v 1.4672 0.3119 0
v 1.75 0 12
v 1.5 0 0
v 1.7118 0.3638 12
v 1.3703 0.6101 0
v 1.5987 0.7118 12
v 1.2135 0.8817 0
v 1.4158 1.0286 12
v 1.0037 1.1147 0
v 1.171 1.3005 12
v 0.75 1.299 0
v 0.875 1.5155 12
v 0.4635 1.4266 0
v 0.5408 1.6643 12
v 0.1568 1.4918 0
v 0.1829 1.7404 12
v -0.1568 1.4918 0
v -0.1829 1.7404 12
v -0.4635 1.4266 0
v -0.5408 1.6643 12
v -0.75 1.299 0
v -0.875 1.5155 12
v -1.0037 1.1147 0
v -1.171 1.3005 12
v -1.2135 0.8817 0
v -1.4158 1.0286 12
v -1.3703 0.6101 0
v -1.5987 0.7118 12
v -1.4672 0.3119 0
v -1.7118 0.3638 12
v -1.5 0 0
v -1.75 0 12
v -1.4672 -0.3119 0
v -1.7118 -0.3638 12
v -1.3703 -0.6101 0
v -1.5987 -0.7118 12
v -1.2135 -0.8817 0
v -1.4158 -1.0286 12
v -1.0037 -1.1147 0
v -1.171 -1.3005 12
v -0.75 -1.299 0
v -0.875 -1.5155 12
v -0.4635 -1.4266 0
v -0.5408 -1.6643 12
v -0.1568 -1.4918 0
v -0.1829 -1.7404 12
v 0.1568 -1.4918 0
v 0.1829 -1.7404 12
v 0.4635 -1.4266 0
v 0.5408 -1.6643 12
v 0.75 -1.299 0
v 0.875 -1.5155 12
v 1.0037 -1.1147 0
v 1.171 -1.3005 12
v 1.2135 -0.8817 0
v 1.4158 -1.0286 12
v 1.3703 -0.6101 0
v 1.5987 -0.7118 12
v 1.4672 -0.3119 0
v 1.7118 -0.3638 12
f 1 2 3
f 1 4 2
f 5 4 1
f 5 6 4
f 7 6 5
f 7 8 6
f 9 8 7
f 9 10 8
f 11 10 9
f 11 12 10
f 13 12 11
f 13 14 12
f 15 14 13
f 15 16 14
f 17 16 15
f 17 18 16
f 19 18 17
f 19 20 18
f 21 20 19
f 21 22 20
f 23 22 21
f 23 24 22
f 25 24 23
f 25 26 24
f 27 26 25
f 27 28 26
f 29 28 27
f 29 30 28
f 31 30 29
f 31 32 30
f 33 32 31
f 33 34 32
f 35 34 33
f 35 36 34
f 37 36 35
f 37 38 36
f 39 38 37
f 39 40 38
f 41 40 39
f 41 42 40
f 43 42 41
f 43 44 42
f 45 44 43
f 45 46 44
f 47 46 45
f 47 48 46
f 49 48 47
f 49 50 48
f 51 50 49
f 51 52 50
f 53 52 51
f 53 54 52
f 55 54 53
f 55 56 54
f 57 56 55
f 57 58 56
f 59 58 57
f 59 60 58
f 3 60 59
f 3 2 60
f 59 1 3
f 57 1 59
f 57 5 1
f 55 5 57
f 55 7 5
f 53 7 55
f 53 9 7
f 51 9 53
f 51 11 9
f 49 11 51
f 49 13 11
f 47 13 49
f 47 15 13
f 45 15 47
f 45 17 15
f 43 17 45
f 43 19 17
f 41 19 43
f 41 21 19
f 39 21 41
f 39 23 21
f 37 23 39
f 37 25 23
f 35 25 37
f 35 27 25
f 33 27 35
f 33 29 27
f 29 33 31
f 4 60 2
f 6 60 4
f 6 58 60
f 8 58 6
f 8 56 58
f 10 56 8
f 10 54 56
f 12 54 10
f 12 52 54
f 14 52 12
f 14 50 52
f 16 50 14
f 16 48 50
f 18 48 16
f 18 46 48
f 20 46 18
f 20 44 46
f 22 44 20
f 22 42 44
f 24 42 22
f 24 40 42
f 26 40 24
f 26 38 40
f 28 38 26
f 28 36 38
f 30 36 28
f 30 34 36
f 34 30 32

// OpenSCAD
// file: Peg.scad
// Puzzlebox Bloom
//
// component: Peg (Replacement Screw and Mounting Pin)
//
// designed by Puzzlebox Productions, LLC
// http://puzzlebox.io/bloom
//
// Copyright Puzzlebox Productions, LLC (2014-2015)
//
// License: Creative Commons - Attribution - Share Alike
//          https://creativecommons.org/licenses/by-sa/3.0


module assemble_peg(){
	
	build_peg();
	
}


module build_peg(){
	
	color([0.4,0.4,0.4])
	translate([0,0,peg_length/2])
		cylinder(h=peg_length, d2=peg_diameter-tol, d1=peg_diameter-(tol*2), center=true);
	
	
}
// main file
// Puzzlebox Bloom
//
// component: Peg
//
// edition: Drafting
//
// by Puzzlebox Productions, LLC
// http://puzzlebox.io/bloom
//
// License: Creative Commons - Attribution - Share Alike
//          https://creativecommons.org/licenses/by-sa/3.0


// Libraries
include <../Configuration.scad>
include <../peg/Peg.scad>


// Rendering quality (calculated via angle in degrees)
$fa=12;
$fn=30;

// Main
assemble_peg();
